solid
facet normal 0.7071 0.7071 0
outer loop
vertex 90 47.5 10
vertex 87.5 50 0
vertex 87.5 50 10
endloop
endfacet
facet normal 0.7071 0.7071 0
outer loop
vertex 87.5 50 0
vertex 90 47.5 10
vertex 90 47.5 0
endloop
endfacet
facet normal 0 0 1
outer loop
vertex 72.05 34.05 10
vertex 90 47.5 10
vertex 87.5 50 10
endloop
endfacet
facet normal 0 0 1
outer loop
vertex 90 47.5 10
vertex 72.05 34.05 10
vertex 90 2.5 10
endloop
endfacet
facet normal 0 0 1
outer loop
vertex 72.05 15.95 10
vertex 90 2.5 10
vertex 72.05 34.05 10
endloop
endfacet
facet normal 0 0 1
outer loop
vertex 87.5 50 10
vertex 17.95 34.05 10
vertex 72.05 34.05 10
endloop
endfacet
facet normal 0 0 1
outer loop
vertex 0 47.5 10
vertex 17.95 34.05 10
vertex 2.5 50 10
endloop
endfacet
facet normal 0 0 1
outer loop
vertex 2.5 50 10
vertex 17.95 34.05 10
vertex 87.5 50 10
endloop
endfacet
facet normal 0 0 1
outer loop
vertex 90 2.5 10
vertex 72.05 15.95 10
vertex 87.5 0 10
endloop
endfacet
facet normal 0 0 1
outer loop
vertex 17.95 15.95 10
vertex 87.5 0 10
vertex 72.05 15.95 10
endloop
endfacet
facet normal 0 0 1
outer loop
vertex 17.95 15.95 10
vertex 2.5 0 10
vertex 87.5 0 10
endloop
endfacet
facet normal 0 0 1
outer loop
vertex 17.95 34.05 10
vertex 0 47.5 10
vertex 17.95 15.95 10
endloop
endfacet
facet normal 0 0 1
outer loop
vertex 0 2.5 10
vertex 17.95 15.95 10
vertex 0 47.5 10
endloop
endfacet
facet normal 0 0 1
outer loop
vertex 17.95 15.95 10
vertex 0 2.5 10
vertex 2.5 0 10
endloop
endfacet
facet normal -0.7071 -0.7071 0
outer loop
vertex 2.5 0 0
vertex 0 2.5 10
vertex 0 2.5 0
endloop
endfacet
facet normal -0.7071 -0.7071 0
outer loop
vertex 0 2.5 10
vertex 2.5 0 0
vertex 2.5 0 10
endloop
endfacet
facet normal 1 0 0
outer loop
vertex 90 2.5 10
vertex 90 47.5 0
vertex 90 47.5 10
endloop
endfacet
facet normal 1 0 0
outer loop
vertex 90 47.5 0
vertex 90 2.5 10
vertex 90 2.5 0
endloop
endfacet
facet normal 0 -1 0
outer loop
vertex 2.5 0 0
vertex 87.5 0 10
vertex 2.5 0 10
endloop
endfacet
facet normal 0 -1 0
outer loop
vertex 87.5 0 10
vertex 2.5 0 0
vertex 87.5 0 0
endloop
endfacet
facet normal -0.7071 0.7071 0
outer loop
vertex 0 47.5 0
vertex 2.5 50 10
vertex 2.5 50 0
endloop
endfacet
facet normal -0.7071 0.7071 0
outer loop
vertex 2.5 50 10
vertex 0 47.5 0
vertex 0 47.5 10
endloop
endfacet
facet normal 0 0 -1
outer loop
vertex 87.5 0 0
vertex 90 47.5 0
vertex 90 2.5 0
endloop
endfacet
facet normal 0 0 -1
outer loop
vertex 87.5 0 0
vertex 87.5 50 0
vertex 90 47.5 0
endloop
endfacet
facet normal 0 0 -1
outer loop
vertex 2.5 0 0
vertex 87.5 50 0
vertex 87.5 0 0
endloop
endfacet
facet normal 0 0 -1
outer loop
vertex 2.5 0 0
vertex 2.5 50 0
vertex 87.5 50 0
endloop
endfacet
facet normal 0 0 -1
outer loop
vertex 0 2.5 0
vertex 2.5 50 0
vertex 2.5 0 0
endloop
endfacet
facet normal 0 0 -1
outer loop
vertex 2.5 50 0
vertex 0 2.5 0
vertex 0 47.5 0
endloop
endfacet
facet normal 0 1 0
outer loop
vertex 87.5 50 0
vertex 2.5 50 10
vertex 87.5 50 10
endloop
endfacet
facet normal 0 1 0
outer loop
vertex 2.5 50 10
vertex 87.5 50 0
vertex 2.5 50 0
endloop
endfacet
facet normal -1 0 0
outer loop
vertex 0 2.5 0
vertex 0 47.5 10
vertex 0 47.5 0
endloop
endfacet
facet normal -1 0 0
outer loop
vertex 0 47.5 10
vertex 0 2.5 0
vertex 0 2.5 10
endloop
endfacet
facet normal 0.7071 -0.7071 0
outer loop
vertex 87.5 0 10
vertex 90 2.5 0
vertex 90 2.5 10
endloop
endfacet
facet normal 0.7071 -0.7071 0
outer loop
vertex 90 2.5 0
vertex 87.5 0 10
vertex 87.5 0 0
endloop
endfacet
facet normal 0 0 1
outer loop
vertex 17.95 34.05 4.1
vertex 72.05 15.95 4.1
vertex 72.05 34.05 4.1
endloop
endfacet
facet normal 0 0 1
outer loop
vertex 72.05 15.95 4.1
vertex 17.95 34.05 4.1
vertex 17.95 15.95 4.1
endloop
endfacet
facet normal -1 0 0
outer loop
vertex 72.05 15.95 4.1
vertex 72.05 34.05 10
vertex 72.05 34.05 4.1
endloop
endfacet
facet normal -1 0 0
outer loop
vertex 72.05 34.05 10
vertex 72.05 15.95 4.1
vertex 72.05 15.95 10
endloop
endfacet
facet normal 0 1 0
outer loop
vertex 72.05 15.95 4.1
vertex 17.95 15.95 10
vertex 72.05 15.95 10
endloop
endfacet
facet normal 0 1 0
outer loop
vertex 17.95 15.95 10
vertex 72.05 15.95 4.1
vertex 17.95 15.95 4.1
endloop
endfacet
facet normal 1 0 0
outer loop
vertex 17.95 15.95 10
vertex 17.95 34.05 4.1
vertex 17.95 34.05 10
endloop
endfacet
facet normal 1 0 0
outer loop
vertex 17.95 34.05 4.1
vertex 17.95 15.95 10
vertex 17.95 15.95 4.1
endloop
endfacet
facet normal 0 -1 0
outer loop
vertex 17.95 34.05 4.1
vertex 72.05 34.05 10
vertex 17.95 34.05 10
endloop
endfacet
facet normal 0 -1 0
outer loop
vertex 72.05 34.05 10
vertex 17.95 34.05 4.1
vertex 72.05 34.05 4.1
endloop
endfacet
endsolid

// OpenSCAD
$fn = 32;

// ----------------------------------------------------------------------
// Windowed plate: 1 voids, 90 x 50 x 10 mm
// ----------------------------------------------------------------------

// --- parameters (mm) ---
plate_l = 90;             // plate length, X
plate_w = 50;             // plate width, Y
plate_t = 10;             // plate thickness, Z
edge_margin = 12;         // wall from the plate edge to any window
win1_l = 54.1;            // window length
win1_w = 18.1;            // window width
depth_1 = 5.9;            // depth of void 1 (full thickness = through)
corner_c = 2.5;           // corner chamfer of the plate

profile = [[2.5, 0], [87.5, 0], [90, 2.5], [90, 47.5], [87.5, 50], [2.5, 50], [0, 47.5], [0, 2.5]];  // primary outline, 8 points, counter clockwise
void_1 = [[17.95, 15.95], [72.05, 15.95], [72.05, 34.05], [17.95, 34.05]];  // large central window, 4 points

// --- the one profile operation ---
difference() {
  linear_extrude(height = plate_t) polygon(points = profile);
  translate([0, 0, plate_t - depth_1])
    linear_extrude(height = depth_1 + 1) polygon(points = void_1);
}
